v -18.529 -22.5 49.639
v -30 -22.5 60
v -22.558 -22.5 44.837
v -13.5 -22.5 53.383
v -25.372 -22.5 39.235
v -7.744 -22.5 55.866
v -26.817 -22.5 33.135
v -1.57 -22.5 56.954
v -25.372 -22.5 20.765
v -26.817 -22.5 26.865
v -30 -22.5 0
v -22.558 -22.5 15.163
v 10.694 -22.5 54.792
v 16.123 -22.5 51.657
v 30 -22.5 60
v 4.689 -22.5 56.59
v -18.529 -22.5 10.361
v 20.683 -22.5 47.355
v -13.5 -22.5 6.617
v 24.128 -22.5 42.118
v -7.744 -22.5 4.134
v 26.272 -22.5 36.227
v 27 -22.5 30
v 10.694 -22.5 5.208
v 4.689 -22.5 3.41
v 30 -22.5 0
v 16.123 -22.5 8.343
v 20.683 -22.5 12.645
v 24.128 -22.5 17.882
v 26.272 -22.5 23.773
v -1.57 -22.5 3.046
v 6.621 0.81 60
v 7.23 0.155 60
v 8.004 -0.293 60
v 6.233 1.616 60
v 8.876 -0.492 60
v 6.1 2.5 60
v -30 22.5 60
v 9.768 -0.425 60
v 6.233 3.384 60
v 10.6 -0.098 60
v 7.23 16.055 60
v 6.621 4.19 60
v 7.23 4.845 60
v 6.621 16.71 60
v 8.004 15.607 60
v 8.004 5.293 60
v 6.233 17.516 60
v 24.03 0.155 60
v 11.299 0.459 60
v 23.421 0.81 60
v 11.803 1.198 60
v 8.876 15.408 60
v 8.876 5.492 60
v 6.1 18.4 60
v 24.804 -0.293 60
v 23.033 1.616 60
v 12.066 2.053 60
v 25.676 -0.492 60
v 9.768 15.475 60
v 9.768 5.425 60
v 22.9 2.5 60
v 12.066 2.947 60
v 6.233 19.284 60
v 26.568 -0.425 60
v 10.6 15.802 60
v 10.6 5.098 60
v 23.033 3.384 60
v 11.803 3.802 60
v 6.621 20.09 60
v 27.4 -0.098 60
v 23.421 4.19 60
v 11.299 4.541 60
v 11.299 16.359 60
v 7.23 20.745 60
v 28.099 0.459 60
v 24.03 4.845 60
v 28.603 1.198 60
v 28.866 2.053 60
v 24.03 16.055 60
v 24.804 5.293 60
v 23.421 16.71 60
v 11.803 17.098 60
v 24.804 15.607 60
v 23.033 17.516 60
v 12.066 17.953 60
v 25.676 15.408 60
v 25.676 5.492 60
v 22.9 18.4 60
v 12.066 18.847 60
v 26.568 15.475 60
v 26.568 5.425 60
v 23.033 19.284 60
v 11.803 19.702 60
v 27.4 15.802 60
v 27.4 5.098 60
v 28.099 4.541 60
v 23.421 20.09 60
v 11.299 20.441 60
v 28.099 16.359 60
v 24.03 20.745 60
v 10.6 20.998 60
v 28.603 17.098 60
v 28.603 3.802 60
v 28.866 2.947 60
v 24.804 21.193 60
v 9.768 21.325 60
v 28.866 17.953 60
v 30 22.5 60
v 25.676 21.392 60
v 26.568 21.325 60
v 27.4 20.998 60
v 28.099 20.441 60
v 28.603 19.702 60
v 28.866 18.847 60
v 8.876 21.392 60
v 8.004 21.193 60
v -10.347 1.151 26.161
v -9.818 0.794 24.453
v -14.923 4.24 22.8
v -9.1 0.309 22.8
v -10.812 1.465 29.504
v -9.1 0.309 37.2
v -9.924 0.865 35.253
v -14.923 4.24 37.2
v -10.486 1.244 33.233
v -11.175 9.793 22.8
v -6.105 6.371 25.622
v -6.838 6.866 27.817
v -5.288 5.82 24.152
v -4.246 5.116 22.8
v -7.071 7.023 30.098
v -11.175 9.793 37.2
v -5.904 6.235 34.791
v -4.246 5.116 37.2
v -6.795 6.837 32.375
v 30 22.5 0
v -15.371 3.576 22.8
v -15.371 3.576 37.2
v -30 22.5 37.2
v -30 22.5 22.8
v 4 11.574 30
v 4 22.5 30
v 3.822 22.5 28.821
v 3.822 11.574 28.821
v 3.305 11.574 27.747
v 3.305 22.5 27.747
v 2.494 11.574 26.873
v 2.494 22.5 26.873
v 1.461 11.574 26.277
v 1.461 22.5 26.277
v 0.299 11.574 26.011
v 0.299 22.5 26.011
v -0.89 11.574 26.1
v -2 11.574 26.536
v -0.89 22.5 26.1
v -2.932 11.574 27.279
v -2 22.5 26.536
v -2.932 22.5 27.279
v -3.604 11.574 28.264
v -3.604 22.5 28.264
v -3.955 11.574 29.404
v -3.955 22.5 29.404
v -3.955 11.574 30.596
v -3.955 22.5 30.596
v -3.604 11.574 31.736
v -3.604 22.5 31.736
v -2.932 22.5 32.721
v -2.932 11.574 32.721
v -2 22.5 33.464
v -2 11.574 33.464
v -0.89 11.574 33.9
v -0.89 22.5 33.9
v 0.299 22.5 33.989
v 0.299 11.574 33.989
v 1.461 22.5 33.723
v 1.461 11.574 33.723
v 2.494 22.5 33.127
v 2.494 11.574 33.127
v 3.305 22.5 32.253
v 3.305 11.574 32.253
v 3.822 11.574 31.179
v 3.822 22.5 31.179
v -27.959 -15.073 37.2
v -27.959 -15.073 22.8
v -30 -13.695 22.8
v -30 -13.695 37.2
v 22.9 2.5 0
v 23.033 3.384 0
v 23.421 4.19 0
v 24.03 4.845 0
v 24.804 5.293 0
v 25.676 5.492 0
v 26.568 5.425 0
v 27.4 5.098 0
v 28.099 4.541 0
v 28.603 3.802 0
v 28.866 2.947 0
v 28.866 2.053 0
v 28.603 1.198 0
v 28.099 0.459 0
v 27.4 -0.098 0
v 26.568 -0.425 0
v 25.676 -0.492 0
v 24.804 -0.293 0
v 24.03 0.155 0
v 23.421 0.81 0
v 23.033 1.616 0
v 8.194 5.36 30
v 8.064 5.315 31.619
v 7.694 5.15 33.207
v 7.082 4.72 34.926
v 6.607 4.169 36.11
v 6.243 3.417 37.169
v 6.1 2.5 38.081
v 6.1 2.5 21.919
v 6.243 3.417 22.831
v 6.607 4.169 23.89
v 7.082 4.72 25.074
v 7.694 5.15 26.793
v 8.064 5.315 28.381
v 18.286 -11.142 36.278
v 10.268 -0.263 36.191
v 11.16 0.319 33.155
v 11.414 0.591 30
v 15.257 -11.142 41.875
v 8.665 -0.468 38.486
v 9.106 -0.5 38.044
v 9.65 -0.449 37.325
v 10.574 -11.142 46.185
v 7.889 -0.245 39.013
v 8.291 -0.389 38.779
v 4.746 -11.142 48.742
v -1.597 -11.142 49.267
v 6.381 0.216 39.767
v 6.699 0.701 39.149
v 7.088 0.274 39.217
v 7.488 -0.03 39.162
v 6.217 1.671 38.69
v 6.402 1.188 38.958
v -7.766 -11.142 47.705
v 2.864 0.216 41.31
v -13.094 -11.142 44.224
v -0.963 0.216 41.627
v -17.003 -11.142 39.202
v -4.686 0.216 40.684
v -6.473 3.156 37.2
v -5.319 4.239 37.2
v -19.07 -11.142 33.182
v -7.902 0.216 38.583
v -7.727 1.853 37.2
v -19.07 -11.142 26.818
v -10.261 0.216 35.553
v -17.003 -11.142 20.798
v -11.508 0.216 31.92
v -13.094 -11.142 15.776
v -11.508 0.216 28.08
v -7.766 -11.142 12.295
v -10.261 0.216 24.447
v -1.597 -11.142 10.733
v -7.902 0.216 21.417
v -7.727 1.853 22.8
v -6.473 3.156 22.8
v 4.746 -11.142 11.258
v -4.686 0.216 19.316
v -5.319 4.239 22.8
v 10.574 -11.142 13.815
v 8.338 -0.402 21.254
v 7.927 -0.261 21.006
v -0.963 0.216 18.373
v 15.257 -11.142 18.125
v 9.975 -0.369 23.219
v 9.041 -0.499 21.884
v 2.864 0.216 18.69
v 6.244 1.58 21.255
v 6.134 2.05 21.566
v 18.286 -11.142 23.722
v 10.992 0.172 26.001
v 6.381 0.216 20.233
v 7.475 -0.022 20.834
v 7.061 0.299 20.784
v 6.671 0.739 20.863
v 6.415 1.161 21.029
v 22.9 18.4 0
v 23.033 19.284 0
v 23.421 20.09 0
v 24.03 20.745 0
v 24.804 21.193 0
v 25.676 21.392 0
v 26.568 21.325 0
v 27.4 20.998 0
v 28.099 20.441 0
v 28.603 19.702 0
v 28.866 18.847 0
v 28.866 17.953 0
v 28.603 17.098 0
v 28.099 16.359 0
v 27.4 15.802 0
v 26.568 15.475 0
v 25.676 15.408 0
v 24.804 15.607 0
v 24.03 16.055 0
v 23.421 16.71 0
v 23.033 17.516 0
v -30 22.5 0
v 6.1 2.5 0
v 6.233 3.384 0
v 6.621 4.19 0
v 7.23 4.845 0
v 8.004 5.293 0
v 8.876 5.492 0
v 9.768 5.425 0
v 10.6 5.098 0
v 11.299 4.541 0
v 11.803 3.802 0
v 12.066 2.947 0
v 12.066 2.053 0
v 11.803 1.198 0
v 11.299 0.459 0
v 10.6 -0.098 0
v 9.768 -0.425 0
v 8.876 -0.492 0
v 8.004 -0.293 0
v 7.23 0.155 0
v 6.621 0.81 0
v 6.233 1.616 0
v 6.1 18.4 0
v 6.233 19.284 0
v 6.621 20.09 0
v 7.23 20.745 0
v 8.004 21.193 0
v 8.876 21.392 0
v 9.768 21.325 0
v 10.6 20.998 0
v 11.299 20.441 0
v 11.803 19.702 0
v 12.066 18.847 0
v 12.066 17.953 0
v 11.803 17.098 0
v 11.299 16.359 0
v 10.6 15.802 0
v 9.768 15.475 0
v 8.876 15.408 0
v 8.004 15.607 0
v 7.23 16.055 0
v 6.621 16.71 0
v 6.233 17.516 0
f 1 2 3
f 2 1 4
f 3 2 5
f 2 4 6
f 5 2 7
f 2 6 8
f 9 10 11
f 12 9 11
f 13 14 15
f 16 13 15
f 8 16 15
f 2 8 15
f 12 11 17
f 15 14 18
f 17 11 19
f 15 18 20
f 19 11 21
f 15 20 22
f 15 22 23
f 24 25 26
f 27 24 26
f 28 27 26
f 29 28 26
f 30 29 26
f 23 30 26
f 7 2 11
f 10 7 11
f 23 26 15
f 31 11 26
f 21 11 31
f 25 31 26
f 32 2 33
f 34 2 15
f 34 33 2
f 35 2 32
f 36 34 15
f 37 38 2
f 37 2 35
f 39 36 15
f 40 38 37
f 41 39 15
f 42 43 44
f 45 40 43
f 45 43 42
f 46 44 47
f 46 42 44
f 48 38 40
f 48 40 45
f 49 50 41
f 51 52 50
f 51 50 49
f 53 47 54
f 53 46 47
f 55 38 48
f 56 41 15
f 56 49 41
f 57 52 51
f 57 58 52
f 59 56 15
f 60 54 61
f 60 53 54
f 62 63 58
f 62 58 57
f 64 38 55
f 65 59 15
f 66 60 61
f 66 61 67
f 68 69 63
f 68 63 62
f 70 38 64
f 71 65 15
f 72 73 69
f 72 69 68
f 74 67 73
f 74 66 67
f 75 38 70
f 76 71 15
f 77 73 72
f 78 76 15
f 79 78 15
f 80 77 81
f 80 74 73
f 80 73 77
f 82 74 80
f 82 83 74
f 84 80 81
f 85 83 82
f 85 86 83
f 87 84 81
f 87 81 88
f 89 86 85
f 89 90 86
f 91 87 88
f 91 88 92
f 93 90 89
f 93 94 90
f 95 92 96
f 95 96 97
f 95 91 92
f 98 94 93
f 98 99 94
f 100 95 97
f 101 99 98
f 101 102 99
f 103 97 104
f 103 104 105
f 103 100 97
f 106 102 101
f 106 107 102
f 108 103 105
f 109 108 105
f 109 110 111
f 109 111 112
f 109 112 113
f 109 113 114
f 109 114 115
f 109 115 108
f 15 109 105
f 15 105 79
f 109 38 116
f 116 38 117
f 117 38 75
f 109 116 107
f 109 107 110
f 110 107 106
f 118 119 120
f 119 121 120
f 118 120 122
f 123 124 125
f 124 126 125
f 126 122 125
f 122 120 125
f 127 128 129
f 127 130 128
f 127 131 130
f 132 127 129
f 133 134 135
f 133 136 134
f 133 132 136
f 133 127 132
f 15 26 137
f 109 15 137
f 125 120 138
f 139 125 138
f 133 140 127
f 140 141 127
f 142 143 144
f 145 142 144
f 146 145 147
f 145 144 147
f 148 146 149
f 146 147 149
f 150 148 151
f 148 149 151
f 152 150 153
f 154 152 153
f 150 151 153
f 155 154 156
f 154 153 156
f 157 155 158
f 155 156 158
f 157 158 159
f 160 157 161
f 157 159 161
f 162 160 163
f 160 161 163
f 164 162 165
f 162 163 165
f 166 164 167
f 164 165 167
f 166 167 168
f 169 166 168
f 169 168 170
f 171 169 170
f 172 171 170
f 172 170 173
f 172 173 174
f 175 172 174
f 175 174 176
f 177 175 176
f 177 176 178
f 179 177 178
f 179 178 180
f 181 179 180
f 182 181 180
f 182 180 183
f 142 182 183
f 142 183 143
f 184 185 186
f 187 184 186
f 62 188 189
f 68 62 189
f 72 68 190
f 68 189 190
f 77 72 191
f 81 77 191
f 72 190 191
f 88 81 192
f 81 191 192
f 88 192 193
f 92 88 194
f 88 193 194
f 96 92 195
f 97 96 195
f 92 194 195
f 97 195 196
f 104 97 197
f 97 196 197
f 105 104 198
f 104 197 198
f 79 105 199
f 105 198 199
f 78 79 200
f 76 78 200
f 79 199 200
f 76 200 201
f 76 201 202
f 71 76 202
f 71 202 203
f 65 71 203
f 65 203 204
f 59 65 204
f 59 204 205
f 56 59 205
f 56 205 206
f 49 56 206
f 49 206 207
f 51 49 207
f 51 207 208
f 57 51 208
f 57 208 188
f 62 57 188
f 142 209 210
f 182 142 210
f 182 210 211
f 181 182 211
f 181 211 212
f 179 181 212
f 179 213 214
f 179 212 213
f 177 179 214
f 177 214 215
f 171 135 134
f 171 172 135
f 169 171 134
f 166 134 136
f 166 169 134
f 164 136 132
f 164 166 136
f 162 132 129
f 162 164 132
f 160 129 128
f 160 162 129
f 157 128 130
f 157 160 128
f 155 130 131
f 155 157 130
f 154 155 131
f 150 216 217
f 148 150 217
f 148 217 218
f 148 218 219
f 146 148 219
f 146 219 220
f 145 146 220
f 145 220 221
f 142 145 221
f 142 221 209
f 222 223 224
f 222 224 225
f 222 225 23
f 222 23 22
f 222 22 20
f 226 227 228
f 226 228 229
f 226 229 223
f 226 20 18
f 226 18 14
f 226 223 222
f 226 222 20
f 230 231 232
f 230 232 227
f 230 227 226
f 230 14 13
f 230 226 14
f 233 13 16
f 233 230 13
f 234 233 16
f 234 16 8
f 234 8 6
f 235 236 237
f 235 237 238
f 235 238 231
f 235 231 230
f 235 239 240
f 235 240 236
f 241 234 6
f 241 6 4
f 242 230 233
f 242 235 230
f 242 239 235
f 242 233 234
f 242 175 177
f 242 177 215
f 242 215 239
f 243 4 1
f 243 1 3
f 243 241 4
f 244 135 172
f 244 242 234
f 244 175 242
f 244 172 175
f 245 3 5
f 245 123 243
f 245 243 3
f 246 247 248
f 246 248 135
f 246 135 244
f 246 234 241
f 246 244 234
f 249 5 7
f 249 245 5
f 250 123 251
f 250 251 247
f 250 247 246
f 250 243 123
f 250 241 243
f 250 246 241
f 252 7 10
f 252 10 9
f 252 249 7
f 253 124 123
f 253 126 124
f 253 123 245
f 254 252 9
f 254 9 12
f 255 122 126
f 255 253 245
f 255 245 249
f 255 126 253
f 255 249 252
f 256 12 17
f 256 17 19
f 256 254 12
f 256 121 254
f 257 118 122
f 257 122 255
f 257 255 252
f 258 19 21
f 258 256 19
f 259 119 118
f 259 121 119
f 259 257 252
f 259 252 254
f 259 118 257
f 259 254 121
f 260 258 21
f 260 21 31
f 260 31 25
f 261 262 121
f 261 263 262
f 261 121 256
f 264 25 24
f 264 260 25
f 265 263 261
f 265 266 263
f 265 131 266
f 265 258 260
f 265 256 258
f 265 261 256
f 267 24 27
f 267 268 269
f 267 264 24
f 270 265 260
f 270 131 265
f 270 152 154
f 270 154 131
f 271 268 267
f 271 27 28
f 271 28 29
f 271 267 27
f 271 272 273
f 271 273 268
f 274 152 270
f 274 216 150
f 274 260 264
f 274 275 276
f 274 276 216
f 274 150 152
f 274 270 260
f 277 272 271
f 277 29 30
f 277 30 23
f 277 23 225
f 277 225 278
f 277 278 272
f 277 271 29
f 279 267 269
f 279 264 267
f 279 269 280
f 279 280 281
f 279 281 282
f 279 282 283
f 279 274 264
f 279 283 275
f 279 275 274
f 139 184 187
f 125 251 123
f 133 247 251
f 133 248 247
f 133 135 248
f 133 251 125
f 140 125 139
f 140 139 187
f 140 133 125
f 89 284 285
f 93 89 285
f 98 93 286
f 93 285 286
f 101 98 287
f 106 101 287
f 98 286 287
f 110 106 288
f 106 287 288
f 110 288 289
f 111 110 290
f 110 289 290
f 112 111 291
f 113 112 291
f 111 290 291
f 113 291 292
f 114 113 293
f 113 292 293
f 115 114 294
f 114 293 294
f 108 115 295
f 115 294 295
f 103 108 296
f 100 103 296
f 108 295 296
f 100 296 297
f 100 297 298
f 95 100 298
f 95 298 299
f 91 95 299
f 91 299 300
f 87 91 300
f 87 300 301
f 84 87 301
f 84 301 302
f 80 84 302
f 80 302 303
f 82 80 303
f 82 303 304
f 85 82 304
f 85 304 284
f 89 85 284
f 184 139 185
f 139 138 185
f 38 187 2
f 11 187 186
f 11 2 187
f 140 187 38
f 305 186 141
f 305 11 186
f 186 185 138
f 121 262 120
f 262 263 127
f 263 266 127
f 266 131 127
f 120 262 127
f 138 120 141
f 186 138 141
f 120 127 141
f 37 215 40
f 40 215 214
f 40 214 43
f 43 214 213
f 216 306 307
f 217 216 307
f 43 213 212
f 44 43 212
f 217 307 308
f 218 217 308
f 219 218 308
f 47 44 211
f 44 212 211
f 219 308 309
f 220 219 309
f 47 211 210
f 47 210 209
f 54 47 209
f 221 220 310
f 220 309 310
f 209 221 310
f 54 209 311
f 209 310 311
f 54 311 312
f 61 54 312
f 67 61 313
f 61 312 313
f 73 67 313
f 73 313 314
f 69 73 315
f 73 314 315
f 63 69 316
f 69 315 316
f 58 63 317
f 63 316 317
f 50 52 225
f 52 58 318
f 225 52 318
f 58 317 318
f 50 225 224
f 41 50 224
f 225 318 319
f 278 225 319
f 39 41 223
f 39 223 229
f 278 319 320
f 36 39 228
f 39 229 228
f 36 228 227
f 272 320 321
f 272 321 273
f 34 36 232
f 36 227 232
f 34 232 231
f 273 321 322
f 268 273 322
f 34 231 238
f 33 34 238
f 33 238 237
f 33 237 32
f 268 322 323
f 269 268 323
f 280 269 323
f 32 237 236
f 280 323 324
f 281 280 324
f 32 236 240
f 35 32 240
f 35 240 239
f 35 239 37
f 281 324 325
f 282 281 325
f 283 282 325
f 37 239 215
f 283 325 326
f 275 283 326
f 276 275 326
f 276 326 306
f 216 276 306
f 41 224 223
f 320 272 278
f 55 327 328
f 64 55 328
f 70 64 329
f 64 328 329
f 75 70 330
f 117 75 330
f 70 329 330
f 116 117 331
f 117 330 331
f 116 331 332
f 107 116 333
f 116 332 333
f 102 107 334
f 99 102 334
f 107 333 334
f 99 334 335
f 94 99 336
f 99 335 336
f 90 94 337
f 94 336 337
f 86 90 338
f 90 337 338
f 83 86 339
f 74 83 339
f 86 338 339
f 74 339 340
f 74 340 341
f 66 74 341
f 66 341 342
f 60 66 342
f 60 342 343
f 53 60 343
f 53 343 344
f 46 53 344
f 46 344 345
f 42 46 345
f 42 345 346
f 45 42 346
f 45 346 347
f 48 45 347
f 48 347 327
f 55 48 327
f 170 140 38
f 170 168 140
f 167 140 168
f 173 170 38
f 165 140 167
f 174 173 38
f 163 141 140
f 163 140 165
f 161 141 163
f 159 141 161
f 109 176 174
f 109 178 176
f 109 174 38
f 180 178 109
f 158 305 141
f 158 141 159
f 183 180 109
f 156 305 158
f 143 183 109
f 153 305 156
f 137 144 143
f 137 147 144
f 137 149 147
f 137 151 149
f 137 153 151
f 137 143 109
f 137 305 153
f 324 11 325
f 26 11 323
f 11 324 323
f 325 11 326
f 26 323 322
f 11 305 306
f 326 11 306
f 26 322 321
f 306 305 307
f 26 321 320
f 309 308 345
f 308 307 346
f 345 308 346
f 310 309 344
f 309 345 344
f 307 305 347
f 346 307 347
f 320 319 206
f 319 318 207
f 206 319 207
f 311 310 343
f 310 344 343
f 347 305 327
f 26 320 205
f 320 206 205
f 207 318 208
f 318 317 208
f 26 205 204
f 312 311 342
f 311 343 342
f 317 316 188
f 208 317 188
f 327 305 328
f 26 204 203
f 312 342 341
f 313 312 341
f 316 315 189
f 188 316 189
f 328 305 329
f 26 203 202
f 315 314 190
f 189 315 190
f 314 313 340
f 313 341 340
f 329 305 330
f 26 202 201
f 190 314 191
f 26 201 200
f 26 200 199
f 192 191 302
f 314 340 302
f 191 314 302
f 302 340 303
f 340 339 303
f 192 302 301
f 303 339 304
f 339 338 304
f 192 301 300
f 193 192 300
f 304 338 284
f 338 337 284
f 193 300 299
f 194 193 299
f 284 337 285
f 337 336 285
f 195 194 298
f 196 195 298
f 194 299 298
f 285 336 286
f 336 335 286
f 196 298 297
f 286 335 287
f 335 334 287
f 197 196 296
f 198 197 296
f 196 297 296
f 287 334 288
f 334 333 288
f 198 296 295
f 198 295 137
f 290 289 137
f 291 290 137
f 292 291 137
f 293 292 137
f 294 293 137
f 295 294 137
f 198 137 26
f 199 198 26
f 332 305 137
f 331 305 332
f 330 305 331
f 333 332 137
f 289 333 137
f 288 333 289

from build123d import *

# Parameters (mm, degrees)
SKETCH_1_W               = 60
SKETCH_1_H               = 45
EXTRUDE_1_DEPTH          = 60
SKETCH_3_R               = 4
CUT_EXTRUDE_1_DEPTH      = 1
CUT_EXTRUDE_1_DEPTH_BACK = 46
SKETCH_4_R               = 3
CUT_EXTRUDE_2_DEPTH      = 1
CUT_EXTRUDE_2_DEPTH_BACK = 61
CUT_EXTRUDE_8_DEPTH      = 7.2
CUT_EXTRUDE_9_REACH      = 54.194
SKETCH_6_W               = 14.4
SKETCH_6_H               = 6.7


with BuildPart() as part:
    # 스케치1 → 보스-돌출1 (new body)
    with BuildSketch(Plane.XY):
        Rectangle(SKETCH_1_W, SKETCH_1_H)
    extrude(amount=EXTRUDE_1_DEPTH)

    # 스케치2 → 컷-회전1 (revolve, cut)
    with BuildSketch(Plane(origin=(0, 0, 30), x_dir=(-1, 0, 0), z_dir=(0, 0, -1))):
        Polygon((0, 17.5), (0, -22.5), (-27, -22.5), align=None)
    revolve(axis=Axis((0, 17.5, 30), (0, -1, 0)), mode=Mode.SUBTRACT)

    # 스케치3 → 컷-돌출1 (cut, two sides)
    with BuildSketch(Plane(origin=(0, 22.5, 0), x_dir=(1, 0, 0), z_dir=(0, 1, 0))) as cut_extrude_1_sk:
        with Locations((0, -30)):
            Circle(SKETCH_3_R)
    extrude(amount=CUT_EXTRUDE_1_DEPTH, mode=Mode.SUBTRACT)
    extrude(cut_extrude_1_sk.sketch, amount=-CUT_EXTRUDE_1_DEPTH_BACK, mode=Mode.SUBTRACT)

    # 스케치4 → 컷-돌출2 (cut, two sides)
    with BuildSketch(Plane(origin=(0, 0, 0), x_dir=(-1, 0, 0), z_dir=(0, 0, -1))) as cut_extrude_2_sk:
        with Locations((-25.9, 18.4)):
            Circle(SKETCH_4_R)
        with Locations((-25.9, 2.5)):
            Circle(SKETCH_4_R)
        with Locations((-9.1, 18.4)):
            Circle(SKETCH_4_R)
        with Locations((-9.1, 2.5)):
            Circle(SKETCH_4_R)
    extrude(amount=CUT_EXTRUDE_2_DEPTH, mode=Mode.SUBTRACT)
    extrude(cut_extrude_2_sk.sketch, amount=-CUT_EXTRUDE_2_DEPTH_BACK, mode=Mode.SUBTRACT)

    # 스케치5 → 컷-돌출8 (cut, symmetric)
    with BuildSketch(Plane(origin=(0, 0, 30), x_dir=(-1, 0, 0), z_dir=(0, 0, -1))):
        Polygon((15.370551943, 3.576426178), (27.958691181, -15.072668989), (30, -13.694785536), (30, 22.5), (11.174505531, 9.792791233), align=None)
    extrude(amount=CUT_EXTRUDE_8_DEPTH, both=True, mode=Mode.SUBTRACT)

    # 스케치6 → 컷-돌출9 (cut, up to next)
    with BuildSketch(Plane(origin=(-12.217871783, 8.247063453, 0), x_dir=(0, 0, 1), z_dir=(-0.828848674, 0.559472855, 0)), mode=Mode.PRIVATE) as cut_extrude_9_sk1:
        with Locations((30, -1.485090483)):
            Rectangle(SKETCH_6_W, SKETCH_6_H)
    cut_extrude_9_tool1 = extrude(cut_extrude_9_sk1.sketch, amount=-CUT_EXTRUDE_9_REACH, mode=Mode.PRIVATE) & part.part
    add(cut_extrude_9_tool1.solids().sort_by_distance((-13.04874, 7.016148, 30))[0], mode=Mode.SUBTRACT)


solid = part.part
